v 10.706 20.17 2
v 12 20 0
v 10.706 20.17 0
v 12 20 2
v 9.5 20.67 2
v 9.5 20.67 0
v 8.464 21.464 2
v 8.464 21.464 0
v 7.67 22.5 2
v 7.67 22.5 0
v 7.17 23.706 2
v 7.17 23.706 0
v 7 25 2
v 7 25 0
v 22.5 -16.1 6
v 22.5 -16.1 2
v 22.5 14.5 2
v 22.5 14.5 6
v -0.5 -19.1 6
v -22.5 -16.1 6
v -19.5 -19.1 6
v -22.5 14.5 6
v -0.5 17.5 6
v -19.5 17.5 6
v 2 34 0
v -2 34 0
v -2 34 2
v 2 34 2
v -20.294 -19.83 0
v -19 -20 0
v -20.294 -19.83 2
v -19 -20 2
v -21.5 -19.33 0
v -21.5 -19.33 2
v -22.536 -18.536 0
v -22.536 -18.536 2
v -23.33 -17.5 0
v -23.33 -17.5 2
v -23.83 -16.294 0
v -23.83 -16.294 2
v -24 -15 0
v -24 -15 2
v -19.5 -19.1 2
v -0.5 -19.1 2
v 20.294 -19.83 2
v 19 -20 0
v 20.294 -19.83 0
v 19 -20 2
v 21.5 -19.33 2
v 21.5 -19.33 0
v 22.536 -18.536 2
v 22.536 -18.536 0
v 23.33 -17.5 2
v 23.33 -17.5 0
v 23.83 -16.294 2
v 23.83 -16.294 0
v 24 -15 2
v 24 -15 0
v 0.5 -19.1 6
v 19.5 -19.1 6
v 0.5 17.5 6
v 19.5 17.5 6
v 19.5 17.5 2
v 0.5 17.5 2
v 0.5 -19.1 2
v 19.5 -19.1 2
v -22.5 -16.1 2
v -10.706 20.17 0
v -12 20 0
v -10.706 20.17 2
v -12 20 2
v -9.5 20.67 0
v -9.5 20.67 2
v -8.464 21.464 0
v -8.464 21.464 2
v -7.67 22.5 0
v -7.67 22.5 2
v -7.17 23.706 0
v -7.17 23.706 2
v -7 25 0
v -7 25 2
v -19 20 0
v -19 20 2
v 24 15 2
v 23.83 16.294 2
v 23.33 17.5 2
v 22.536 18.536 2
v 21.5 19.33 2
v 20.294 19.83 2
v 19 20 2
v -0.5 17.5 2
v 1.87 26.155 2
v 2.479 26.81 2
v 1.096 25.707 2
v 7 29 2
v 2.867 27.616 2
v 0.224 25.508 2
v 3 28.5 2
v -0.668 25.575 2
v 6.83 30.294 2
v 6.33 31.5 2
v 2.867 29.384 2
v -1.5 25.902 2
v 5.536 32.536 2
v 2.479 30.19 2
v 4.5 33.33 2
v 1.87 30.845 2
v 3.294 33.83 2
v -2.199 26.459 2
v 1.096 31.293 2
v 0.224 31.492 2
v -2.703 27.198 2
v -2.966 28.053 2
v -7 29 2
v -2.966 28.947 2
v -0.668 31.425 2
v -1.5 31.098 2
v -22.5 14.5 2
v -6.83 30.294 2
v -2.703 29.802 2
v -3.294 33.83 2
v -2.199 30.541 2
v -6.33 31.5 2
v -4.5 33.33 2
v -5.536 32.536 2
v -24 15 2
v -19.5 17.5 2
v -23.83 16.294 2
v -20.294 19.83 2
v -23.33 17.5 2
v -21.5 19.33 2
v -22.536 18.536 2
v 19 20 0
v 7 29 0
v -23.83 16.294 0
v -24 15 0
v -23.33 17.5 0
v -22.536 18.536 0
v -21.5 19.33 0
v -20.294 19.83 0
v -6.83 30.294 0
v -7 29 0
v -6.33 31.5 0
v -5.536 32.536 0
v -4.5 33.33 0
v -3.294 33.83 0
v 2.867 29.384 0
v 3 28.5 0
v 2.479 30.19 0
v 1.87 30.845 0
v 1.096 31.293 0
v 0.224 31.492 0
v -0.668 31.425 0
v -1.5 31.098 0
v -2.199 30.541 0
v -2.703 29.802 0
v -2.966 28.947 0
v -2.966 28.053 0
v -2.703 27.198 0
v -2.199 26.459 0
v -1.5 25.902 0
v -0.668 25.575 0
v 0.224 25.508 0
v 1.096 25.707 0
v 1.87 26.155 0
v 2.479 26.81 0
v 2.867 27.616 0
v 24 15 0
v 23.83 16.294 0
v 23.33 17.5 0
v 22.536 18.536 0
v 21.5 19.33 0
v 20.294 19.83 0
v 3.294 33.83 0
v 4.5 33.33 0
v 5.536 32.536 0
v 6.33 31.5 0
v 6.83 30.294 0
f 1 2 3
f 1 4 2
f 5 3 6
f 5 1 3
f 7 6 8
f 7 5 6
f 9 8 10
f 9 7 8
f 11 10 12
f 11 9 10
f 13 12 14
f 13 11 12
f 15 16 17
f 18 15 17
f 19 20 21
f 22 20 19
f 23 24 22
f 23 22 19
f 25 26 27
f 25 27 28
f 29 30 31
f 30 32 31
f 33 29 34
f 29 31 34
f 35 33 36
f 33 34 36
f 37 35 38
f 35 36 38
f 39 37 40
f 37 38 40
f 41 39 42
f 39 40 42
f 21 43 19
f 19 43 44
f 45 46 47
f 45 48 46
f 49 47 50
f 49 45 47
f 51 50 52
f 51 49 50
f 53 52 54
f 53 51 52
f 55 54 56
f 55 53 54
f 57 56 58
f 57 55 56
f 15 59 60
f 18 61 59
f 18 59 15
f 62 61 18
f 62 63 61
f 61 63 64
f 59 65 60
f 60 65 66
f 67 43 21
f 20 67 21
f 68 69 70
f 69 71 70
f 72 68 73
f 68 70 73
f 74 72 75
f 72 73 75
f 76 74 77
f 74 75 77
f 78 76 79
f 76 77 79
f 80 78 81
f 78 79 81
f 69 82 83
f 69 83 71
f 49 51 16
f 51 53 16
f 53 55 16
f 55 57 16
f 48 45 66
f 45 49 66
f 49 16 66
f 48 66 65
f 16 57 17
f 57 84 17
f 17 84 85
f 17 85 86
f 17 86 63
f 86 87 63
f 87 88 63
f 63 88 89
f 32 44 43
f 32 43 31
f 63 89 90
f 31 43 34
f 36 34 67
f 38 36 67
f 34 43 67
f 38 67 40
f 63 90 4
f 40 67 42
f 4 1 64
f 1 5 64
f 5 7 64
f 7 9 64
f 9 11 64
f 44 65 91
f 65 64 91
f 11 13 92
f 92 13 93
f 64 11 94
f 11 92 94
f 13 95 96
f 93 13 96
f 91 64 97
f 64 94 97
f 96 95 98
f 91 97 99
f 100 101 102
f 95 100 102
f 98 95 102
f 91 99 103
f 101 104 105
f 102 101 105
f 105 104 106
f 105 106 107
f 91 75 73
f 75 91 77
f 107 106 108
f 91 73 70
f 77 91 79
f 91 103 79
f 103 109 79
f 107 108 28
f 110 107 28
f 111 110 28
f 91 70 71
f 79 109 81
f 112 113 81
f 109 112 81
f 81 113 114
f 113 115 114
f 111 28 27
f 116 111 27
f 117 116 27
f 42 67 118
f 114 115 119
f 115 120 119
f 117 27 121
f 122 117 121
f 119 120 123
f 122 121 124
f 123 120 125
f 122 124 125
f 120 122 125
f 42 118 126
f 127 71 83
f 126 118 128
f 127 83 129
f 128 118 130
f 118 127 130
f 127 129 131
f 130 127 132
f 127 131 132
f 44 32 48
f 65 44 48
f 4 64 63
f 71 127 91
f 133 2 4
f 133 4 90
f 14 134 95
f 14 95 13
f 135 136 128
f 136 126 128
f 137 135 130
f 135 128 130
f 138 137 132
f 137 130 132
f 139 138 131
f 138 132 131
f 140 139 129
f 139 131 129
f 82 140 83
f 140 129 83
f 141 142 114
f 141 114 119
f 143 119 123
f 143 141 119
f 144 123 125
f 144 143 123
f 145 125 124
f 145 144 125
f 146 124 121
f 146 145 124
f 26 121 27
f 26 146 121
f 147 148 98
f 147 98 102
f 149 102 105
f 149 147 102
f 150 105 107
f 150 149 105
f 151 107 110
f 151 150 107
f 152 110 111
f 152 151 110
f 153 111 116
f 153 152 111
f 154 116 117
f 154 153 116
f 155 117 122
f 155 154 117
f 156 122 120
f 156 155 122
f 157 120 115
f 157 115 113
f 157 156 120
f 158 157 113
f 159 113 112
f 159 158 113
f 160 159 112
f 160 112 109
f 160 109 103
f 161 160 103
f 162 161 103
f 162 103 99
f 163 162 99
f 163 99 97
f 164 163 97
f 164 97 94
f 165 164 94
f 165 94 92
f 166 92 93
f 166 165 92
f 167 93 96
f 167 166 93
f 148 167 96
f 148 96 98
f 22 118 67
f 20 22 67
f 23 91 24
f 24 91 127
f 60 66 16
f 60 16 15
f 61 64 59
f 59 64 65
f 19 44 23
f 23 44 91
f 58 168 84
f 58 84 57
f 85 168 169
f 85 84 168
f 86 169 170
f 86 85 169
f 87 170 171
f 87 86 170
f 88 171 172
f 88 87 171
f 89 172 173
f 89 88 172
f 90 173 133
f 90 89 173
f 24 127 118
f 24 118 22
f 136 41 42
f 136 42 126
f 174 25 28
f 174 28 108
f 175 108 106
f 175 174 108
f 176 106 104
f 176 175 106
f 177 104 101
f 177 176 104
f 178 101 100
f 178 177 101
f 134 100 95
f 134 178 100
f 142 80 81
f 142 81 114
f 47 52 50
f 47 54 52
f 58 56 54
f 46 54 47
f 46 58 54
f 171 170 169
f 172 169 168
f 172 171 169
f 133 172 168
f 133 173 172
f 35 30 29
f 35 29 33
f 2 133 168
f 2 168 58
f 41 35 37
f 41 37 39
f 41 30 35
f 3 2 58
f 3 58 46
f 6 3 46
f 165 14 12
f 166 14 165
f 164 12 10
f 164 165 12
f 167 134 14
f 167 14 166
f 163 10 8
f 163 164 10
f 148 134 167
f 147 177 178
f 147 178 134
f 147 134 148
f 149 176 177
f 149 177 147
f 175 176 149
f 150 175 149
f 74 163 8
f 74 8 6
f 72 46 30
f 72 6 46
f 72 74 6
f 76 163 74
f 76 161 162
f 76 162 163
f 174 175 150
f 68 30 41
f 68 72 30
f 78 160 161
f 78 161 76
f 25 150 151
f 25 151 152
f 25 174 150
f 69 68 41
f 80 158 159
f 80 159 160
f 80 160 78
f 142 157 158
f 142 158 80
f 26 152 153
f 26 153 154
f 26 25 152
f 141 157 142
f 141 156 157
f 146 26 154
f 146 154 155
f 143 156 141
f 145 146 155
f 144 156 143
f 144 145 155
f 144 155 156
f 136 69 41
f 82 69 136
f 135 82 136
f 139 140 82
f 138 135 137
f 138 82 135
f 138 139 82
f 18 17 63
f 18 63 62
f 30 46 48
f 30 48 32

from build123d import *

# Parameters (mm, degrees)
SKETCH1_R           = 3
BOSS_EXTRUDE1_DEPTH = 2
BOSS_EXTRUDE2_DEPTH = 4
CHAMFER1_SIZE       = 3
FILLET1_R           = 5


with BuildPart() as part:
    # Sketch1 → Boss-Extrude1 (new body)
    with BuildSketch(Plane.XY):
        with BuildLine():
            Line((24, -20), (-24, -20))
            Line((-24, -20), (-24, 20))
            Line((-24, 20), (-7, 20))
            Line((-7, 20), (-7, 29))
            ThreePointArc((-7, 29), (-5.535533906, 32.535533906), (-2, 34))
            Line((-2, 34), (2, 34))
            ThreePointArc((2, 34), (5.535533906, 32.535533906), (7, 29))
            Line((7, 29), (7, 20))
            Line((7, 20), (24, 20))
            Line((24, 20), (24, -20))
        make_face()
        with Locations((0, 28.5)):
            Circle(SKETCH1_R, mode=Mode.SUBTRACT)
    extrude(amount=BOSS_EXTRUDE1_DEPTH)

    # Sketch2 → Boss-Extrude2 (add)
    with BuildSketch(Plane.XY.offset(2)):
        Polygon((-22.5, -17.5), (-22.5, -19.10035342), (-0.5, -19.10035342), (-0.5, -17.5), (-0.5, 17.5), (-22.5, 17.5), align=None)
        Polygon((22.5, -17.5), (22.5, 17.5), (0.5, 17.5), (0.5, -17.5), (0.5, -19.10035342), (22.5, -19.10035342), align=None)
    extrude(amount=BOSS_EXTRUDE2_DEPTH)

    # Chamfer1
    chamfer1_edges = [part.edges().sort_by_distance(p)[0] for p in [
        (-22.5, 17.5, 4),
        (-22.5, -19.10035342, 4),
        (22.5, -19.10035342, 4),
        (22.5, 17.5, 4),
    ]]
    chamfer(chamfer1_edges, length=CHAMFER1_SIZE)

    # Fillet1
    fillet1_edges = [part.edges().sort_by_distance(p)[0] for p in [
        (-7, 20, 1),
        (7, 20, 1),
        (24, 20, 1),
        (24, -20, 1),
        (-24, -20, 1),
        (-24, 20, 1),
    ]]
    fillet(fillet1_edges, radius=FILLET1_R)


solid = part.part
